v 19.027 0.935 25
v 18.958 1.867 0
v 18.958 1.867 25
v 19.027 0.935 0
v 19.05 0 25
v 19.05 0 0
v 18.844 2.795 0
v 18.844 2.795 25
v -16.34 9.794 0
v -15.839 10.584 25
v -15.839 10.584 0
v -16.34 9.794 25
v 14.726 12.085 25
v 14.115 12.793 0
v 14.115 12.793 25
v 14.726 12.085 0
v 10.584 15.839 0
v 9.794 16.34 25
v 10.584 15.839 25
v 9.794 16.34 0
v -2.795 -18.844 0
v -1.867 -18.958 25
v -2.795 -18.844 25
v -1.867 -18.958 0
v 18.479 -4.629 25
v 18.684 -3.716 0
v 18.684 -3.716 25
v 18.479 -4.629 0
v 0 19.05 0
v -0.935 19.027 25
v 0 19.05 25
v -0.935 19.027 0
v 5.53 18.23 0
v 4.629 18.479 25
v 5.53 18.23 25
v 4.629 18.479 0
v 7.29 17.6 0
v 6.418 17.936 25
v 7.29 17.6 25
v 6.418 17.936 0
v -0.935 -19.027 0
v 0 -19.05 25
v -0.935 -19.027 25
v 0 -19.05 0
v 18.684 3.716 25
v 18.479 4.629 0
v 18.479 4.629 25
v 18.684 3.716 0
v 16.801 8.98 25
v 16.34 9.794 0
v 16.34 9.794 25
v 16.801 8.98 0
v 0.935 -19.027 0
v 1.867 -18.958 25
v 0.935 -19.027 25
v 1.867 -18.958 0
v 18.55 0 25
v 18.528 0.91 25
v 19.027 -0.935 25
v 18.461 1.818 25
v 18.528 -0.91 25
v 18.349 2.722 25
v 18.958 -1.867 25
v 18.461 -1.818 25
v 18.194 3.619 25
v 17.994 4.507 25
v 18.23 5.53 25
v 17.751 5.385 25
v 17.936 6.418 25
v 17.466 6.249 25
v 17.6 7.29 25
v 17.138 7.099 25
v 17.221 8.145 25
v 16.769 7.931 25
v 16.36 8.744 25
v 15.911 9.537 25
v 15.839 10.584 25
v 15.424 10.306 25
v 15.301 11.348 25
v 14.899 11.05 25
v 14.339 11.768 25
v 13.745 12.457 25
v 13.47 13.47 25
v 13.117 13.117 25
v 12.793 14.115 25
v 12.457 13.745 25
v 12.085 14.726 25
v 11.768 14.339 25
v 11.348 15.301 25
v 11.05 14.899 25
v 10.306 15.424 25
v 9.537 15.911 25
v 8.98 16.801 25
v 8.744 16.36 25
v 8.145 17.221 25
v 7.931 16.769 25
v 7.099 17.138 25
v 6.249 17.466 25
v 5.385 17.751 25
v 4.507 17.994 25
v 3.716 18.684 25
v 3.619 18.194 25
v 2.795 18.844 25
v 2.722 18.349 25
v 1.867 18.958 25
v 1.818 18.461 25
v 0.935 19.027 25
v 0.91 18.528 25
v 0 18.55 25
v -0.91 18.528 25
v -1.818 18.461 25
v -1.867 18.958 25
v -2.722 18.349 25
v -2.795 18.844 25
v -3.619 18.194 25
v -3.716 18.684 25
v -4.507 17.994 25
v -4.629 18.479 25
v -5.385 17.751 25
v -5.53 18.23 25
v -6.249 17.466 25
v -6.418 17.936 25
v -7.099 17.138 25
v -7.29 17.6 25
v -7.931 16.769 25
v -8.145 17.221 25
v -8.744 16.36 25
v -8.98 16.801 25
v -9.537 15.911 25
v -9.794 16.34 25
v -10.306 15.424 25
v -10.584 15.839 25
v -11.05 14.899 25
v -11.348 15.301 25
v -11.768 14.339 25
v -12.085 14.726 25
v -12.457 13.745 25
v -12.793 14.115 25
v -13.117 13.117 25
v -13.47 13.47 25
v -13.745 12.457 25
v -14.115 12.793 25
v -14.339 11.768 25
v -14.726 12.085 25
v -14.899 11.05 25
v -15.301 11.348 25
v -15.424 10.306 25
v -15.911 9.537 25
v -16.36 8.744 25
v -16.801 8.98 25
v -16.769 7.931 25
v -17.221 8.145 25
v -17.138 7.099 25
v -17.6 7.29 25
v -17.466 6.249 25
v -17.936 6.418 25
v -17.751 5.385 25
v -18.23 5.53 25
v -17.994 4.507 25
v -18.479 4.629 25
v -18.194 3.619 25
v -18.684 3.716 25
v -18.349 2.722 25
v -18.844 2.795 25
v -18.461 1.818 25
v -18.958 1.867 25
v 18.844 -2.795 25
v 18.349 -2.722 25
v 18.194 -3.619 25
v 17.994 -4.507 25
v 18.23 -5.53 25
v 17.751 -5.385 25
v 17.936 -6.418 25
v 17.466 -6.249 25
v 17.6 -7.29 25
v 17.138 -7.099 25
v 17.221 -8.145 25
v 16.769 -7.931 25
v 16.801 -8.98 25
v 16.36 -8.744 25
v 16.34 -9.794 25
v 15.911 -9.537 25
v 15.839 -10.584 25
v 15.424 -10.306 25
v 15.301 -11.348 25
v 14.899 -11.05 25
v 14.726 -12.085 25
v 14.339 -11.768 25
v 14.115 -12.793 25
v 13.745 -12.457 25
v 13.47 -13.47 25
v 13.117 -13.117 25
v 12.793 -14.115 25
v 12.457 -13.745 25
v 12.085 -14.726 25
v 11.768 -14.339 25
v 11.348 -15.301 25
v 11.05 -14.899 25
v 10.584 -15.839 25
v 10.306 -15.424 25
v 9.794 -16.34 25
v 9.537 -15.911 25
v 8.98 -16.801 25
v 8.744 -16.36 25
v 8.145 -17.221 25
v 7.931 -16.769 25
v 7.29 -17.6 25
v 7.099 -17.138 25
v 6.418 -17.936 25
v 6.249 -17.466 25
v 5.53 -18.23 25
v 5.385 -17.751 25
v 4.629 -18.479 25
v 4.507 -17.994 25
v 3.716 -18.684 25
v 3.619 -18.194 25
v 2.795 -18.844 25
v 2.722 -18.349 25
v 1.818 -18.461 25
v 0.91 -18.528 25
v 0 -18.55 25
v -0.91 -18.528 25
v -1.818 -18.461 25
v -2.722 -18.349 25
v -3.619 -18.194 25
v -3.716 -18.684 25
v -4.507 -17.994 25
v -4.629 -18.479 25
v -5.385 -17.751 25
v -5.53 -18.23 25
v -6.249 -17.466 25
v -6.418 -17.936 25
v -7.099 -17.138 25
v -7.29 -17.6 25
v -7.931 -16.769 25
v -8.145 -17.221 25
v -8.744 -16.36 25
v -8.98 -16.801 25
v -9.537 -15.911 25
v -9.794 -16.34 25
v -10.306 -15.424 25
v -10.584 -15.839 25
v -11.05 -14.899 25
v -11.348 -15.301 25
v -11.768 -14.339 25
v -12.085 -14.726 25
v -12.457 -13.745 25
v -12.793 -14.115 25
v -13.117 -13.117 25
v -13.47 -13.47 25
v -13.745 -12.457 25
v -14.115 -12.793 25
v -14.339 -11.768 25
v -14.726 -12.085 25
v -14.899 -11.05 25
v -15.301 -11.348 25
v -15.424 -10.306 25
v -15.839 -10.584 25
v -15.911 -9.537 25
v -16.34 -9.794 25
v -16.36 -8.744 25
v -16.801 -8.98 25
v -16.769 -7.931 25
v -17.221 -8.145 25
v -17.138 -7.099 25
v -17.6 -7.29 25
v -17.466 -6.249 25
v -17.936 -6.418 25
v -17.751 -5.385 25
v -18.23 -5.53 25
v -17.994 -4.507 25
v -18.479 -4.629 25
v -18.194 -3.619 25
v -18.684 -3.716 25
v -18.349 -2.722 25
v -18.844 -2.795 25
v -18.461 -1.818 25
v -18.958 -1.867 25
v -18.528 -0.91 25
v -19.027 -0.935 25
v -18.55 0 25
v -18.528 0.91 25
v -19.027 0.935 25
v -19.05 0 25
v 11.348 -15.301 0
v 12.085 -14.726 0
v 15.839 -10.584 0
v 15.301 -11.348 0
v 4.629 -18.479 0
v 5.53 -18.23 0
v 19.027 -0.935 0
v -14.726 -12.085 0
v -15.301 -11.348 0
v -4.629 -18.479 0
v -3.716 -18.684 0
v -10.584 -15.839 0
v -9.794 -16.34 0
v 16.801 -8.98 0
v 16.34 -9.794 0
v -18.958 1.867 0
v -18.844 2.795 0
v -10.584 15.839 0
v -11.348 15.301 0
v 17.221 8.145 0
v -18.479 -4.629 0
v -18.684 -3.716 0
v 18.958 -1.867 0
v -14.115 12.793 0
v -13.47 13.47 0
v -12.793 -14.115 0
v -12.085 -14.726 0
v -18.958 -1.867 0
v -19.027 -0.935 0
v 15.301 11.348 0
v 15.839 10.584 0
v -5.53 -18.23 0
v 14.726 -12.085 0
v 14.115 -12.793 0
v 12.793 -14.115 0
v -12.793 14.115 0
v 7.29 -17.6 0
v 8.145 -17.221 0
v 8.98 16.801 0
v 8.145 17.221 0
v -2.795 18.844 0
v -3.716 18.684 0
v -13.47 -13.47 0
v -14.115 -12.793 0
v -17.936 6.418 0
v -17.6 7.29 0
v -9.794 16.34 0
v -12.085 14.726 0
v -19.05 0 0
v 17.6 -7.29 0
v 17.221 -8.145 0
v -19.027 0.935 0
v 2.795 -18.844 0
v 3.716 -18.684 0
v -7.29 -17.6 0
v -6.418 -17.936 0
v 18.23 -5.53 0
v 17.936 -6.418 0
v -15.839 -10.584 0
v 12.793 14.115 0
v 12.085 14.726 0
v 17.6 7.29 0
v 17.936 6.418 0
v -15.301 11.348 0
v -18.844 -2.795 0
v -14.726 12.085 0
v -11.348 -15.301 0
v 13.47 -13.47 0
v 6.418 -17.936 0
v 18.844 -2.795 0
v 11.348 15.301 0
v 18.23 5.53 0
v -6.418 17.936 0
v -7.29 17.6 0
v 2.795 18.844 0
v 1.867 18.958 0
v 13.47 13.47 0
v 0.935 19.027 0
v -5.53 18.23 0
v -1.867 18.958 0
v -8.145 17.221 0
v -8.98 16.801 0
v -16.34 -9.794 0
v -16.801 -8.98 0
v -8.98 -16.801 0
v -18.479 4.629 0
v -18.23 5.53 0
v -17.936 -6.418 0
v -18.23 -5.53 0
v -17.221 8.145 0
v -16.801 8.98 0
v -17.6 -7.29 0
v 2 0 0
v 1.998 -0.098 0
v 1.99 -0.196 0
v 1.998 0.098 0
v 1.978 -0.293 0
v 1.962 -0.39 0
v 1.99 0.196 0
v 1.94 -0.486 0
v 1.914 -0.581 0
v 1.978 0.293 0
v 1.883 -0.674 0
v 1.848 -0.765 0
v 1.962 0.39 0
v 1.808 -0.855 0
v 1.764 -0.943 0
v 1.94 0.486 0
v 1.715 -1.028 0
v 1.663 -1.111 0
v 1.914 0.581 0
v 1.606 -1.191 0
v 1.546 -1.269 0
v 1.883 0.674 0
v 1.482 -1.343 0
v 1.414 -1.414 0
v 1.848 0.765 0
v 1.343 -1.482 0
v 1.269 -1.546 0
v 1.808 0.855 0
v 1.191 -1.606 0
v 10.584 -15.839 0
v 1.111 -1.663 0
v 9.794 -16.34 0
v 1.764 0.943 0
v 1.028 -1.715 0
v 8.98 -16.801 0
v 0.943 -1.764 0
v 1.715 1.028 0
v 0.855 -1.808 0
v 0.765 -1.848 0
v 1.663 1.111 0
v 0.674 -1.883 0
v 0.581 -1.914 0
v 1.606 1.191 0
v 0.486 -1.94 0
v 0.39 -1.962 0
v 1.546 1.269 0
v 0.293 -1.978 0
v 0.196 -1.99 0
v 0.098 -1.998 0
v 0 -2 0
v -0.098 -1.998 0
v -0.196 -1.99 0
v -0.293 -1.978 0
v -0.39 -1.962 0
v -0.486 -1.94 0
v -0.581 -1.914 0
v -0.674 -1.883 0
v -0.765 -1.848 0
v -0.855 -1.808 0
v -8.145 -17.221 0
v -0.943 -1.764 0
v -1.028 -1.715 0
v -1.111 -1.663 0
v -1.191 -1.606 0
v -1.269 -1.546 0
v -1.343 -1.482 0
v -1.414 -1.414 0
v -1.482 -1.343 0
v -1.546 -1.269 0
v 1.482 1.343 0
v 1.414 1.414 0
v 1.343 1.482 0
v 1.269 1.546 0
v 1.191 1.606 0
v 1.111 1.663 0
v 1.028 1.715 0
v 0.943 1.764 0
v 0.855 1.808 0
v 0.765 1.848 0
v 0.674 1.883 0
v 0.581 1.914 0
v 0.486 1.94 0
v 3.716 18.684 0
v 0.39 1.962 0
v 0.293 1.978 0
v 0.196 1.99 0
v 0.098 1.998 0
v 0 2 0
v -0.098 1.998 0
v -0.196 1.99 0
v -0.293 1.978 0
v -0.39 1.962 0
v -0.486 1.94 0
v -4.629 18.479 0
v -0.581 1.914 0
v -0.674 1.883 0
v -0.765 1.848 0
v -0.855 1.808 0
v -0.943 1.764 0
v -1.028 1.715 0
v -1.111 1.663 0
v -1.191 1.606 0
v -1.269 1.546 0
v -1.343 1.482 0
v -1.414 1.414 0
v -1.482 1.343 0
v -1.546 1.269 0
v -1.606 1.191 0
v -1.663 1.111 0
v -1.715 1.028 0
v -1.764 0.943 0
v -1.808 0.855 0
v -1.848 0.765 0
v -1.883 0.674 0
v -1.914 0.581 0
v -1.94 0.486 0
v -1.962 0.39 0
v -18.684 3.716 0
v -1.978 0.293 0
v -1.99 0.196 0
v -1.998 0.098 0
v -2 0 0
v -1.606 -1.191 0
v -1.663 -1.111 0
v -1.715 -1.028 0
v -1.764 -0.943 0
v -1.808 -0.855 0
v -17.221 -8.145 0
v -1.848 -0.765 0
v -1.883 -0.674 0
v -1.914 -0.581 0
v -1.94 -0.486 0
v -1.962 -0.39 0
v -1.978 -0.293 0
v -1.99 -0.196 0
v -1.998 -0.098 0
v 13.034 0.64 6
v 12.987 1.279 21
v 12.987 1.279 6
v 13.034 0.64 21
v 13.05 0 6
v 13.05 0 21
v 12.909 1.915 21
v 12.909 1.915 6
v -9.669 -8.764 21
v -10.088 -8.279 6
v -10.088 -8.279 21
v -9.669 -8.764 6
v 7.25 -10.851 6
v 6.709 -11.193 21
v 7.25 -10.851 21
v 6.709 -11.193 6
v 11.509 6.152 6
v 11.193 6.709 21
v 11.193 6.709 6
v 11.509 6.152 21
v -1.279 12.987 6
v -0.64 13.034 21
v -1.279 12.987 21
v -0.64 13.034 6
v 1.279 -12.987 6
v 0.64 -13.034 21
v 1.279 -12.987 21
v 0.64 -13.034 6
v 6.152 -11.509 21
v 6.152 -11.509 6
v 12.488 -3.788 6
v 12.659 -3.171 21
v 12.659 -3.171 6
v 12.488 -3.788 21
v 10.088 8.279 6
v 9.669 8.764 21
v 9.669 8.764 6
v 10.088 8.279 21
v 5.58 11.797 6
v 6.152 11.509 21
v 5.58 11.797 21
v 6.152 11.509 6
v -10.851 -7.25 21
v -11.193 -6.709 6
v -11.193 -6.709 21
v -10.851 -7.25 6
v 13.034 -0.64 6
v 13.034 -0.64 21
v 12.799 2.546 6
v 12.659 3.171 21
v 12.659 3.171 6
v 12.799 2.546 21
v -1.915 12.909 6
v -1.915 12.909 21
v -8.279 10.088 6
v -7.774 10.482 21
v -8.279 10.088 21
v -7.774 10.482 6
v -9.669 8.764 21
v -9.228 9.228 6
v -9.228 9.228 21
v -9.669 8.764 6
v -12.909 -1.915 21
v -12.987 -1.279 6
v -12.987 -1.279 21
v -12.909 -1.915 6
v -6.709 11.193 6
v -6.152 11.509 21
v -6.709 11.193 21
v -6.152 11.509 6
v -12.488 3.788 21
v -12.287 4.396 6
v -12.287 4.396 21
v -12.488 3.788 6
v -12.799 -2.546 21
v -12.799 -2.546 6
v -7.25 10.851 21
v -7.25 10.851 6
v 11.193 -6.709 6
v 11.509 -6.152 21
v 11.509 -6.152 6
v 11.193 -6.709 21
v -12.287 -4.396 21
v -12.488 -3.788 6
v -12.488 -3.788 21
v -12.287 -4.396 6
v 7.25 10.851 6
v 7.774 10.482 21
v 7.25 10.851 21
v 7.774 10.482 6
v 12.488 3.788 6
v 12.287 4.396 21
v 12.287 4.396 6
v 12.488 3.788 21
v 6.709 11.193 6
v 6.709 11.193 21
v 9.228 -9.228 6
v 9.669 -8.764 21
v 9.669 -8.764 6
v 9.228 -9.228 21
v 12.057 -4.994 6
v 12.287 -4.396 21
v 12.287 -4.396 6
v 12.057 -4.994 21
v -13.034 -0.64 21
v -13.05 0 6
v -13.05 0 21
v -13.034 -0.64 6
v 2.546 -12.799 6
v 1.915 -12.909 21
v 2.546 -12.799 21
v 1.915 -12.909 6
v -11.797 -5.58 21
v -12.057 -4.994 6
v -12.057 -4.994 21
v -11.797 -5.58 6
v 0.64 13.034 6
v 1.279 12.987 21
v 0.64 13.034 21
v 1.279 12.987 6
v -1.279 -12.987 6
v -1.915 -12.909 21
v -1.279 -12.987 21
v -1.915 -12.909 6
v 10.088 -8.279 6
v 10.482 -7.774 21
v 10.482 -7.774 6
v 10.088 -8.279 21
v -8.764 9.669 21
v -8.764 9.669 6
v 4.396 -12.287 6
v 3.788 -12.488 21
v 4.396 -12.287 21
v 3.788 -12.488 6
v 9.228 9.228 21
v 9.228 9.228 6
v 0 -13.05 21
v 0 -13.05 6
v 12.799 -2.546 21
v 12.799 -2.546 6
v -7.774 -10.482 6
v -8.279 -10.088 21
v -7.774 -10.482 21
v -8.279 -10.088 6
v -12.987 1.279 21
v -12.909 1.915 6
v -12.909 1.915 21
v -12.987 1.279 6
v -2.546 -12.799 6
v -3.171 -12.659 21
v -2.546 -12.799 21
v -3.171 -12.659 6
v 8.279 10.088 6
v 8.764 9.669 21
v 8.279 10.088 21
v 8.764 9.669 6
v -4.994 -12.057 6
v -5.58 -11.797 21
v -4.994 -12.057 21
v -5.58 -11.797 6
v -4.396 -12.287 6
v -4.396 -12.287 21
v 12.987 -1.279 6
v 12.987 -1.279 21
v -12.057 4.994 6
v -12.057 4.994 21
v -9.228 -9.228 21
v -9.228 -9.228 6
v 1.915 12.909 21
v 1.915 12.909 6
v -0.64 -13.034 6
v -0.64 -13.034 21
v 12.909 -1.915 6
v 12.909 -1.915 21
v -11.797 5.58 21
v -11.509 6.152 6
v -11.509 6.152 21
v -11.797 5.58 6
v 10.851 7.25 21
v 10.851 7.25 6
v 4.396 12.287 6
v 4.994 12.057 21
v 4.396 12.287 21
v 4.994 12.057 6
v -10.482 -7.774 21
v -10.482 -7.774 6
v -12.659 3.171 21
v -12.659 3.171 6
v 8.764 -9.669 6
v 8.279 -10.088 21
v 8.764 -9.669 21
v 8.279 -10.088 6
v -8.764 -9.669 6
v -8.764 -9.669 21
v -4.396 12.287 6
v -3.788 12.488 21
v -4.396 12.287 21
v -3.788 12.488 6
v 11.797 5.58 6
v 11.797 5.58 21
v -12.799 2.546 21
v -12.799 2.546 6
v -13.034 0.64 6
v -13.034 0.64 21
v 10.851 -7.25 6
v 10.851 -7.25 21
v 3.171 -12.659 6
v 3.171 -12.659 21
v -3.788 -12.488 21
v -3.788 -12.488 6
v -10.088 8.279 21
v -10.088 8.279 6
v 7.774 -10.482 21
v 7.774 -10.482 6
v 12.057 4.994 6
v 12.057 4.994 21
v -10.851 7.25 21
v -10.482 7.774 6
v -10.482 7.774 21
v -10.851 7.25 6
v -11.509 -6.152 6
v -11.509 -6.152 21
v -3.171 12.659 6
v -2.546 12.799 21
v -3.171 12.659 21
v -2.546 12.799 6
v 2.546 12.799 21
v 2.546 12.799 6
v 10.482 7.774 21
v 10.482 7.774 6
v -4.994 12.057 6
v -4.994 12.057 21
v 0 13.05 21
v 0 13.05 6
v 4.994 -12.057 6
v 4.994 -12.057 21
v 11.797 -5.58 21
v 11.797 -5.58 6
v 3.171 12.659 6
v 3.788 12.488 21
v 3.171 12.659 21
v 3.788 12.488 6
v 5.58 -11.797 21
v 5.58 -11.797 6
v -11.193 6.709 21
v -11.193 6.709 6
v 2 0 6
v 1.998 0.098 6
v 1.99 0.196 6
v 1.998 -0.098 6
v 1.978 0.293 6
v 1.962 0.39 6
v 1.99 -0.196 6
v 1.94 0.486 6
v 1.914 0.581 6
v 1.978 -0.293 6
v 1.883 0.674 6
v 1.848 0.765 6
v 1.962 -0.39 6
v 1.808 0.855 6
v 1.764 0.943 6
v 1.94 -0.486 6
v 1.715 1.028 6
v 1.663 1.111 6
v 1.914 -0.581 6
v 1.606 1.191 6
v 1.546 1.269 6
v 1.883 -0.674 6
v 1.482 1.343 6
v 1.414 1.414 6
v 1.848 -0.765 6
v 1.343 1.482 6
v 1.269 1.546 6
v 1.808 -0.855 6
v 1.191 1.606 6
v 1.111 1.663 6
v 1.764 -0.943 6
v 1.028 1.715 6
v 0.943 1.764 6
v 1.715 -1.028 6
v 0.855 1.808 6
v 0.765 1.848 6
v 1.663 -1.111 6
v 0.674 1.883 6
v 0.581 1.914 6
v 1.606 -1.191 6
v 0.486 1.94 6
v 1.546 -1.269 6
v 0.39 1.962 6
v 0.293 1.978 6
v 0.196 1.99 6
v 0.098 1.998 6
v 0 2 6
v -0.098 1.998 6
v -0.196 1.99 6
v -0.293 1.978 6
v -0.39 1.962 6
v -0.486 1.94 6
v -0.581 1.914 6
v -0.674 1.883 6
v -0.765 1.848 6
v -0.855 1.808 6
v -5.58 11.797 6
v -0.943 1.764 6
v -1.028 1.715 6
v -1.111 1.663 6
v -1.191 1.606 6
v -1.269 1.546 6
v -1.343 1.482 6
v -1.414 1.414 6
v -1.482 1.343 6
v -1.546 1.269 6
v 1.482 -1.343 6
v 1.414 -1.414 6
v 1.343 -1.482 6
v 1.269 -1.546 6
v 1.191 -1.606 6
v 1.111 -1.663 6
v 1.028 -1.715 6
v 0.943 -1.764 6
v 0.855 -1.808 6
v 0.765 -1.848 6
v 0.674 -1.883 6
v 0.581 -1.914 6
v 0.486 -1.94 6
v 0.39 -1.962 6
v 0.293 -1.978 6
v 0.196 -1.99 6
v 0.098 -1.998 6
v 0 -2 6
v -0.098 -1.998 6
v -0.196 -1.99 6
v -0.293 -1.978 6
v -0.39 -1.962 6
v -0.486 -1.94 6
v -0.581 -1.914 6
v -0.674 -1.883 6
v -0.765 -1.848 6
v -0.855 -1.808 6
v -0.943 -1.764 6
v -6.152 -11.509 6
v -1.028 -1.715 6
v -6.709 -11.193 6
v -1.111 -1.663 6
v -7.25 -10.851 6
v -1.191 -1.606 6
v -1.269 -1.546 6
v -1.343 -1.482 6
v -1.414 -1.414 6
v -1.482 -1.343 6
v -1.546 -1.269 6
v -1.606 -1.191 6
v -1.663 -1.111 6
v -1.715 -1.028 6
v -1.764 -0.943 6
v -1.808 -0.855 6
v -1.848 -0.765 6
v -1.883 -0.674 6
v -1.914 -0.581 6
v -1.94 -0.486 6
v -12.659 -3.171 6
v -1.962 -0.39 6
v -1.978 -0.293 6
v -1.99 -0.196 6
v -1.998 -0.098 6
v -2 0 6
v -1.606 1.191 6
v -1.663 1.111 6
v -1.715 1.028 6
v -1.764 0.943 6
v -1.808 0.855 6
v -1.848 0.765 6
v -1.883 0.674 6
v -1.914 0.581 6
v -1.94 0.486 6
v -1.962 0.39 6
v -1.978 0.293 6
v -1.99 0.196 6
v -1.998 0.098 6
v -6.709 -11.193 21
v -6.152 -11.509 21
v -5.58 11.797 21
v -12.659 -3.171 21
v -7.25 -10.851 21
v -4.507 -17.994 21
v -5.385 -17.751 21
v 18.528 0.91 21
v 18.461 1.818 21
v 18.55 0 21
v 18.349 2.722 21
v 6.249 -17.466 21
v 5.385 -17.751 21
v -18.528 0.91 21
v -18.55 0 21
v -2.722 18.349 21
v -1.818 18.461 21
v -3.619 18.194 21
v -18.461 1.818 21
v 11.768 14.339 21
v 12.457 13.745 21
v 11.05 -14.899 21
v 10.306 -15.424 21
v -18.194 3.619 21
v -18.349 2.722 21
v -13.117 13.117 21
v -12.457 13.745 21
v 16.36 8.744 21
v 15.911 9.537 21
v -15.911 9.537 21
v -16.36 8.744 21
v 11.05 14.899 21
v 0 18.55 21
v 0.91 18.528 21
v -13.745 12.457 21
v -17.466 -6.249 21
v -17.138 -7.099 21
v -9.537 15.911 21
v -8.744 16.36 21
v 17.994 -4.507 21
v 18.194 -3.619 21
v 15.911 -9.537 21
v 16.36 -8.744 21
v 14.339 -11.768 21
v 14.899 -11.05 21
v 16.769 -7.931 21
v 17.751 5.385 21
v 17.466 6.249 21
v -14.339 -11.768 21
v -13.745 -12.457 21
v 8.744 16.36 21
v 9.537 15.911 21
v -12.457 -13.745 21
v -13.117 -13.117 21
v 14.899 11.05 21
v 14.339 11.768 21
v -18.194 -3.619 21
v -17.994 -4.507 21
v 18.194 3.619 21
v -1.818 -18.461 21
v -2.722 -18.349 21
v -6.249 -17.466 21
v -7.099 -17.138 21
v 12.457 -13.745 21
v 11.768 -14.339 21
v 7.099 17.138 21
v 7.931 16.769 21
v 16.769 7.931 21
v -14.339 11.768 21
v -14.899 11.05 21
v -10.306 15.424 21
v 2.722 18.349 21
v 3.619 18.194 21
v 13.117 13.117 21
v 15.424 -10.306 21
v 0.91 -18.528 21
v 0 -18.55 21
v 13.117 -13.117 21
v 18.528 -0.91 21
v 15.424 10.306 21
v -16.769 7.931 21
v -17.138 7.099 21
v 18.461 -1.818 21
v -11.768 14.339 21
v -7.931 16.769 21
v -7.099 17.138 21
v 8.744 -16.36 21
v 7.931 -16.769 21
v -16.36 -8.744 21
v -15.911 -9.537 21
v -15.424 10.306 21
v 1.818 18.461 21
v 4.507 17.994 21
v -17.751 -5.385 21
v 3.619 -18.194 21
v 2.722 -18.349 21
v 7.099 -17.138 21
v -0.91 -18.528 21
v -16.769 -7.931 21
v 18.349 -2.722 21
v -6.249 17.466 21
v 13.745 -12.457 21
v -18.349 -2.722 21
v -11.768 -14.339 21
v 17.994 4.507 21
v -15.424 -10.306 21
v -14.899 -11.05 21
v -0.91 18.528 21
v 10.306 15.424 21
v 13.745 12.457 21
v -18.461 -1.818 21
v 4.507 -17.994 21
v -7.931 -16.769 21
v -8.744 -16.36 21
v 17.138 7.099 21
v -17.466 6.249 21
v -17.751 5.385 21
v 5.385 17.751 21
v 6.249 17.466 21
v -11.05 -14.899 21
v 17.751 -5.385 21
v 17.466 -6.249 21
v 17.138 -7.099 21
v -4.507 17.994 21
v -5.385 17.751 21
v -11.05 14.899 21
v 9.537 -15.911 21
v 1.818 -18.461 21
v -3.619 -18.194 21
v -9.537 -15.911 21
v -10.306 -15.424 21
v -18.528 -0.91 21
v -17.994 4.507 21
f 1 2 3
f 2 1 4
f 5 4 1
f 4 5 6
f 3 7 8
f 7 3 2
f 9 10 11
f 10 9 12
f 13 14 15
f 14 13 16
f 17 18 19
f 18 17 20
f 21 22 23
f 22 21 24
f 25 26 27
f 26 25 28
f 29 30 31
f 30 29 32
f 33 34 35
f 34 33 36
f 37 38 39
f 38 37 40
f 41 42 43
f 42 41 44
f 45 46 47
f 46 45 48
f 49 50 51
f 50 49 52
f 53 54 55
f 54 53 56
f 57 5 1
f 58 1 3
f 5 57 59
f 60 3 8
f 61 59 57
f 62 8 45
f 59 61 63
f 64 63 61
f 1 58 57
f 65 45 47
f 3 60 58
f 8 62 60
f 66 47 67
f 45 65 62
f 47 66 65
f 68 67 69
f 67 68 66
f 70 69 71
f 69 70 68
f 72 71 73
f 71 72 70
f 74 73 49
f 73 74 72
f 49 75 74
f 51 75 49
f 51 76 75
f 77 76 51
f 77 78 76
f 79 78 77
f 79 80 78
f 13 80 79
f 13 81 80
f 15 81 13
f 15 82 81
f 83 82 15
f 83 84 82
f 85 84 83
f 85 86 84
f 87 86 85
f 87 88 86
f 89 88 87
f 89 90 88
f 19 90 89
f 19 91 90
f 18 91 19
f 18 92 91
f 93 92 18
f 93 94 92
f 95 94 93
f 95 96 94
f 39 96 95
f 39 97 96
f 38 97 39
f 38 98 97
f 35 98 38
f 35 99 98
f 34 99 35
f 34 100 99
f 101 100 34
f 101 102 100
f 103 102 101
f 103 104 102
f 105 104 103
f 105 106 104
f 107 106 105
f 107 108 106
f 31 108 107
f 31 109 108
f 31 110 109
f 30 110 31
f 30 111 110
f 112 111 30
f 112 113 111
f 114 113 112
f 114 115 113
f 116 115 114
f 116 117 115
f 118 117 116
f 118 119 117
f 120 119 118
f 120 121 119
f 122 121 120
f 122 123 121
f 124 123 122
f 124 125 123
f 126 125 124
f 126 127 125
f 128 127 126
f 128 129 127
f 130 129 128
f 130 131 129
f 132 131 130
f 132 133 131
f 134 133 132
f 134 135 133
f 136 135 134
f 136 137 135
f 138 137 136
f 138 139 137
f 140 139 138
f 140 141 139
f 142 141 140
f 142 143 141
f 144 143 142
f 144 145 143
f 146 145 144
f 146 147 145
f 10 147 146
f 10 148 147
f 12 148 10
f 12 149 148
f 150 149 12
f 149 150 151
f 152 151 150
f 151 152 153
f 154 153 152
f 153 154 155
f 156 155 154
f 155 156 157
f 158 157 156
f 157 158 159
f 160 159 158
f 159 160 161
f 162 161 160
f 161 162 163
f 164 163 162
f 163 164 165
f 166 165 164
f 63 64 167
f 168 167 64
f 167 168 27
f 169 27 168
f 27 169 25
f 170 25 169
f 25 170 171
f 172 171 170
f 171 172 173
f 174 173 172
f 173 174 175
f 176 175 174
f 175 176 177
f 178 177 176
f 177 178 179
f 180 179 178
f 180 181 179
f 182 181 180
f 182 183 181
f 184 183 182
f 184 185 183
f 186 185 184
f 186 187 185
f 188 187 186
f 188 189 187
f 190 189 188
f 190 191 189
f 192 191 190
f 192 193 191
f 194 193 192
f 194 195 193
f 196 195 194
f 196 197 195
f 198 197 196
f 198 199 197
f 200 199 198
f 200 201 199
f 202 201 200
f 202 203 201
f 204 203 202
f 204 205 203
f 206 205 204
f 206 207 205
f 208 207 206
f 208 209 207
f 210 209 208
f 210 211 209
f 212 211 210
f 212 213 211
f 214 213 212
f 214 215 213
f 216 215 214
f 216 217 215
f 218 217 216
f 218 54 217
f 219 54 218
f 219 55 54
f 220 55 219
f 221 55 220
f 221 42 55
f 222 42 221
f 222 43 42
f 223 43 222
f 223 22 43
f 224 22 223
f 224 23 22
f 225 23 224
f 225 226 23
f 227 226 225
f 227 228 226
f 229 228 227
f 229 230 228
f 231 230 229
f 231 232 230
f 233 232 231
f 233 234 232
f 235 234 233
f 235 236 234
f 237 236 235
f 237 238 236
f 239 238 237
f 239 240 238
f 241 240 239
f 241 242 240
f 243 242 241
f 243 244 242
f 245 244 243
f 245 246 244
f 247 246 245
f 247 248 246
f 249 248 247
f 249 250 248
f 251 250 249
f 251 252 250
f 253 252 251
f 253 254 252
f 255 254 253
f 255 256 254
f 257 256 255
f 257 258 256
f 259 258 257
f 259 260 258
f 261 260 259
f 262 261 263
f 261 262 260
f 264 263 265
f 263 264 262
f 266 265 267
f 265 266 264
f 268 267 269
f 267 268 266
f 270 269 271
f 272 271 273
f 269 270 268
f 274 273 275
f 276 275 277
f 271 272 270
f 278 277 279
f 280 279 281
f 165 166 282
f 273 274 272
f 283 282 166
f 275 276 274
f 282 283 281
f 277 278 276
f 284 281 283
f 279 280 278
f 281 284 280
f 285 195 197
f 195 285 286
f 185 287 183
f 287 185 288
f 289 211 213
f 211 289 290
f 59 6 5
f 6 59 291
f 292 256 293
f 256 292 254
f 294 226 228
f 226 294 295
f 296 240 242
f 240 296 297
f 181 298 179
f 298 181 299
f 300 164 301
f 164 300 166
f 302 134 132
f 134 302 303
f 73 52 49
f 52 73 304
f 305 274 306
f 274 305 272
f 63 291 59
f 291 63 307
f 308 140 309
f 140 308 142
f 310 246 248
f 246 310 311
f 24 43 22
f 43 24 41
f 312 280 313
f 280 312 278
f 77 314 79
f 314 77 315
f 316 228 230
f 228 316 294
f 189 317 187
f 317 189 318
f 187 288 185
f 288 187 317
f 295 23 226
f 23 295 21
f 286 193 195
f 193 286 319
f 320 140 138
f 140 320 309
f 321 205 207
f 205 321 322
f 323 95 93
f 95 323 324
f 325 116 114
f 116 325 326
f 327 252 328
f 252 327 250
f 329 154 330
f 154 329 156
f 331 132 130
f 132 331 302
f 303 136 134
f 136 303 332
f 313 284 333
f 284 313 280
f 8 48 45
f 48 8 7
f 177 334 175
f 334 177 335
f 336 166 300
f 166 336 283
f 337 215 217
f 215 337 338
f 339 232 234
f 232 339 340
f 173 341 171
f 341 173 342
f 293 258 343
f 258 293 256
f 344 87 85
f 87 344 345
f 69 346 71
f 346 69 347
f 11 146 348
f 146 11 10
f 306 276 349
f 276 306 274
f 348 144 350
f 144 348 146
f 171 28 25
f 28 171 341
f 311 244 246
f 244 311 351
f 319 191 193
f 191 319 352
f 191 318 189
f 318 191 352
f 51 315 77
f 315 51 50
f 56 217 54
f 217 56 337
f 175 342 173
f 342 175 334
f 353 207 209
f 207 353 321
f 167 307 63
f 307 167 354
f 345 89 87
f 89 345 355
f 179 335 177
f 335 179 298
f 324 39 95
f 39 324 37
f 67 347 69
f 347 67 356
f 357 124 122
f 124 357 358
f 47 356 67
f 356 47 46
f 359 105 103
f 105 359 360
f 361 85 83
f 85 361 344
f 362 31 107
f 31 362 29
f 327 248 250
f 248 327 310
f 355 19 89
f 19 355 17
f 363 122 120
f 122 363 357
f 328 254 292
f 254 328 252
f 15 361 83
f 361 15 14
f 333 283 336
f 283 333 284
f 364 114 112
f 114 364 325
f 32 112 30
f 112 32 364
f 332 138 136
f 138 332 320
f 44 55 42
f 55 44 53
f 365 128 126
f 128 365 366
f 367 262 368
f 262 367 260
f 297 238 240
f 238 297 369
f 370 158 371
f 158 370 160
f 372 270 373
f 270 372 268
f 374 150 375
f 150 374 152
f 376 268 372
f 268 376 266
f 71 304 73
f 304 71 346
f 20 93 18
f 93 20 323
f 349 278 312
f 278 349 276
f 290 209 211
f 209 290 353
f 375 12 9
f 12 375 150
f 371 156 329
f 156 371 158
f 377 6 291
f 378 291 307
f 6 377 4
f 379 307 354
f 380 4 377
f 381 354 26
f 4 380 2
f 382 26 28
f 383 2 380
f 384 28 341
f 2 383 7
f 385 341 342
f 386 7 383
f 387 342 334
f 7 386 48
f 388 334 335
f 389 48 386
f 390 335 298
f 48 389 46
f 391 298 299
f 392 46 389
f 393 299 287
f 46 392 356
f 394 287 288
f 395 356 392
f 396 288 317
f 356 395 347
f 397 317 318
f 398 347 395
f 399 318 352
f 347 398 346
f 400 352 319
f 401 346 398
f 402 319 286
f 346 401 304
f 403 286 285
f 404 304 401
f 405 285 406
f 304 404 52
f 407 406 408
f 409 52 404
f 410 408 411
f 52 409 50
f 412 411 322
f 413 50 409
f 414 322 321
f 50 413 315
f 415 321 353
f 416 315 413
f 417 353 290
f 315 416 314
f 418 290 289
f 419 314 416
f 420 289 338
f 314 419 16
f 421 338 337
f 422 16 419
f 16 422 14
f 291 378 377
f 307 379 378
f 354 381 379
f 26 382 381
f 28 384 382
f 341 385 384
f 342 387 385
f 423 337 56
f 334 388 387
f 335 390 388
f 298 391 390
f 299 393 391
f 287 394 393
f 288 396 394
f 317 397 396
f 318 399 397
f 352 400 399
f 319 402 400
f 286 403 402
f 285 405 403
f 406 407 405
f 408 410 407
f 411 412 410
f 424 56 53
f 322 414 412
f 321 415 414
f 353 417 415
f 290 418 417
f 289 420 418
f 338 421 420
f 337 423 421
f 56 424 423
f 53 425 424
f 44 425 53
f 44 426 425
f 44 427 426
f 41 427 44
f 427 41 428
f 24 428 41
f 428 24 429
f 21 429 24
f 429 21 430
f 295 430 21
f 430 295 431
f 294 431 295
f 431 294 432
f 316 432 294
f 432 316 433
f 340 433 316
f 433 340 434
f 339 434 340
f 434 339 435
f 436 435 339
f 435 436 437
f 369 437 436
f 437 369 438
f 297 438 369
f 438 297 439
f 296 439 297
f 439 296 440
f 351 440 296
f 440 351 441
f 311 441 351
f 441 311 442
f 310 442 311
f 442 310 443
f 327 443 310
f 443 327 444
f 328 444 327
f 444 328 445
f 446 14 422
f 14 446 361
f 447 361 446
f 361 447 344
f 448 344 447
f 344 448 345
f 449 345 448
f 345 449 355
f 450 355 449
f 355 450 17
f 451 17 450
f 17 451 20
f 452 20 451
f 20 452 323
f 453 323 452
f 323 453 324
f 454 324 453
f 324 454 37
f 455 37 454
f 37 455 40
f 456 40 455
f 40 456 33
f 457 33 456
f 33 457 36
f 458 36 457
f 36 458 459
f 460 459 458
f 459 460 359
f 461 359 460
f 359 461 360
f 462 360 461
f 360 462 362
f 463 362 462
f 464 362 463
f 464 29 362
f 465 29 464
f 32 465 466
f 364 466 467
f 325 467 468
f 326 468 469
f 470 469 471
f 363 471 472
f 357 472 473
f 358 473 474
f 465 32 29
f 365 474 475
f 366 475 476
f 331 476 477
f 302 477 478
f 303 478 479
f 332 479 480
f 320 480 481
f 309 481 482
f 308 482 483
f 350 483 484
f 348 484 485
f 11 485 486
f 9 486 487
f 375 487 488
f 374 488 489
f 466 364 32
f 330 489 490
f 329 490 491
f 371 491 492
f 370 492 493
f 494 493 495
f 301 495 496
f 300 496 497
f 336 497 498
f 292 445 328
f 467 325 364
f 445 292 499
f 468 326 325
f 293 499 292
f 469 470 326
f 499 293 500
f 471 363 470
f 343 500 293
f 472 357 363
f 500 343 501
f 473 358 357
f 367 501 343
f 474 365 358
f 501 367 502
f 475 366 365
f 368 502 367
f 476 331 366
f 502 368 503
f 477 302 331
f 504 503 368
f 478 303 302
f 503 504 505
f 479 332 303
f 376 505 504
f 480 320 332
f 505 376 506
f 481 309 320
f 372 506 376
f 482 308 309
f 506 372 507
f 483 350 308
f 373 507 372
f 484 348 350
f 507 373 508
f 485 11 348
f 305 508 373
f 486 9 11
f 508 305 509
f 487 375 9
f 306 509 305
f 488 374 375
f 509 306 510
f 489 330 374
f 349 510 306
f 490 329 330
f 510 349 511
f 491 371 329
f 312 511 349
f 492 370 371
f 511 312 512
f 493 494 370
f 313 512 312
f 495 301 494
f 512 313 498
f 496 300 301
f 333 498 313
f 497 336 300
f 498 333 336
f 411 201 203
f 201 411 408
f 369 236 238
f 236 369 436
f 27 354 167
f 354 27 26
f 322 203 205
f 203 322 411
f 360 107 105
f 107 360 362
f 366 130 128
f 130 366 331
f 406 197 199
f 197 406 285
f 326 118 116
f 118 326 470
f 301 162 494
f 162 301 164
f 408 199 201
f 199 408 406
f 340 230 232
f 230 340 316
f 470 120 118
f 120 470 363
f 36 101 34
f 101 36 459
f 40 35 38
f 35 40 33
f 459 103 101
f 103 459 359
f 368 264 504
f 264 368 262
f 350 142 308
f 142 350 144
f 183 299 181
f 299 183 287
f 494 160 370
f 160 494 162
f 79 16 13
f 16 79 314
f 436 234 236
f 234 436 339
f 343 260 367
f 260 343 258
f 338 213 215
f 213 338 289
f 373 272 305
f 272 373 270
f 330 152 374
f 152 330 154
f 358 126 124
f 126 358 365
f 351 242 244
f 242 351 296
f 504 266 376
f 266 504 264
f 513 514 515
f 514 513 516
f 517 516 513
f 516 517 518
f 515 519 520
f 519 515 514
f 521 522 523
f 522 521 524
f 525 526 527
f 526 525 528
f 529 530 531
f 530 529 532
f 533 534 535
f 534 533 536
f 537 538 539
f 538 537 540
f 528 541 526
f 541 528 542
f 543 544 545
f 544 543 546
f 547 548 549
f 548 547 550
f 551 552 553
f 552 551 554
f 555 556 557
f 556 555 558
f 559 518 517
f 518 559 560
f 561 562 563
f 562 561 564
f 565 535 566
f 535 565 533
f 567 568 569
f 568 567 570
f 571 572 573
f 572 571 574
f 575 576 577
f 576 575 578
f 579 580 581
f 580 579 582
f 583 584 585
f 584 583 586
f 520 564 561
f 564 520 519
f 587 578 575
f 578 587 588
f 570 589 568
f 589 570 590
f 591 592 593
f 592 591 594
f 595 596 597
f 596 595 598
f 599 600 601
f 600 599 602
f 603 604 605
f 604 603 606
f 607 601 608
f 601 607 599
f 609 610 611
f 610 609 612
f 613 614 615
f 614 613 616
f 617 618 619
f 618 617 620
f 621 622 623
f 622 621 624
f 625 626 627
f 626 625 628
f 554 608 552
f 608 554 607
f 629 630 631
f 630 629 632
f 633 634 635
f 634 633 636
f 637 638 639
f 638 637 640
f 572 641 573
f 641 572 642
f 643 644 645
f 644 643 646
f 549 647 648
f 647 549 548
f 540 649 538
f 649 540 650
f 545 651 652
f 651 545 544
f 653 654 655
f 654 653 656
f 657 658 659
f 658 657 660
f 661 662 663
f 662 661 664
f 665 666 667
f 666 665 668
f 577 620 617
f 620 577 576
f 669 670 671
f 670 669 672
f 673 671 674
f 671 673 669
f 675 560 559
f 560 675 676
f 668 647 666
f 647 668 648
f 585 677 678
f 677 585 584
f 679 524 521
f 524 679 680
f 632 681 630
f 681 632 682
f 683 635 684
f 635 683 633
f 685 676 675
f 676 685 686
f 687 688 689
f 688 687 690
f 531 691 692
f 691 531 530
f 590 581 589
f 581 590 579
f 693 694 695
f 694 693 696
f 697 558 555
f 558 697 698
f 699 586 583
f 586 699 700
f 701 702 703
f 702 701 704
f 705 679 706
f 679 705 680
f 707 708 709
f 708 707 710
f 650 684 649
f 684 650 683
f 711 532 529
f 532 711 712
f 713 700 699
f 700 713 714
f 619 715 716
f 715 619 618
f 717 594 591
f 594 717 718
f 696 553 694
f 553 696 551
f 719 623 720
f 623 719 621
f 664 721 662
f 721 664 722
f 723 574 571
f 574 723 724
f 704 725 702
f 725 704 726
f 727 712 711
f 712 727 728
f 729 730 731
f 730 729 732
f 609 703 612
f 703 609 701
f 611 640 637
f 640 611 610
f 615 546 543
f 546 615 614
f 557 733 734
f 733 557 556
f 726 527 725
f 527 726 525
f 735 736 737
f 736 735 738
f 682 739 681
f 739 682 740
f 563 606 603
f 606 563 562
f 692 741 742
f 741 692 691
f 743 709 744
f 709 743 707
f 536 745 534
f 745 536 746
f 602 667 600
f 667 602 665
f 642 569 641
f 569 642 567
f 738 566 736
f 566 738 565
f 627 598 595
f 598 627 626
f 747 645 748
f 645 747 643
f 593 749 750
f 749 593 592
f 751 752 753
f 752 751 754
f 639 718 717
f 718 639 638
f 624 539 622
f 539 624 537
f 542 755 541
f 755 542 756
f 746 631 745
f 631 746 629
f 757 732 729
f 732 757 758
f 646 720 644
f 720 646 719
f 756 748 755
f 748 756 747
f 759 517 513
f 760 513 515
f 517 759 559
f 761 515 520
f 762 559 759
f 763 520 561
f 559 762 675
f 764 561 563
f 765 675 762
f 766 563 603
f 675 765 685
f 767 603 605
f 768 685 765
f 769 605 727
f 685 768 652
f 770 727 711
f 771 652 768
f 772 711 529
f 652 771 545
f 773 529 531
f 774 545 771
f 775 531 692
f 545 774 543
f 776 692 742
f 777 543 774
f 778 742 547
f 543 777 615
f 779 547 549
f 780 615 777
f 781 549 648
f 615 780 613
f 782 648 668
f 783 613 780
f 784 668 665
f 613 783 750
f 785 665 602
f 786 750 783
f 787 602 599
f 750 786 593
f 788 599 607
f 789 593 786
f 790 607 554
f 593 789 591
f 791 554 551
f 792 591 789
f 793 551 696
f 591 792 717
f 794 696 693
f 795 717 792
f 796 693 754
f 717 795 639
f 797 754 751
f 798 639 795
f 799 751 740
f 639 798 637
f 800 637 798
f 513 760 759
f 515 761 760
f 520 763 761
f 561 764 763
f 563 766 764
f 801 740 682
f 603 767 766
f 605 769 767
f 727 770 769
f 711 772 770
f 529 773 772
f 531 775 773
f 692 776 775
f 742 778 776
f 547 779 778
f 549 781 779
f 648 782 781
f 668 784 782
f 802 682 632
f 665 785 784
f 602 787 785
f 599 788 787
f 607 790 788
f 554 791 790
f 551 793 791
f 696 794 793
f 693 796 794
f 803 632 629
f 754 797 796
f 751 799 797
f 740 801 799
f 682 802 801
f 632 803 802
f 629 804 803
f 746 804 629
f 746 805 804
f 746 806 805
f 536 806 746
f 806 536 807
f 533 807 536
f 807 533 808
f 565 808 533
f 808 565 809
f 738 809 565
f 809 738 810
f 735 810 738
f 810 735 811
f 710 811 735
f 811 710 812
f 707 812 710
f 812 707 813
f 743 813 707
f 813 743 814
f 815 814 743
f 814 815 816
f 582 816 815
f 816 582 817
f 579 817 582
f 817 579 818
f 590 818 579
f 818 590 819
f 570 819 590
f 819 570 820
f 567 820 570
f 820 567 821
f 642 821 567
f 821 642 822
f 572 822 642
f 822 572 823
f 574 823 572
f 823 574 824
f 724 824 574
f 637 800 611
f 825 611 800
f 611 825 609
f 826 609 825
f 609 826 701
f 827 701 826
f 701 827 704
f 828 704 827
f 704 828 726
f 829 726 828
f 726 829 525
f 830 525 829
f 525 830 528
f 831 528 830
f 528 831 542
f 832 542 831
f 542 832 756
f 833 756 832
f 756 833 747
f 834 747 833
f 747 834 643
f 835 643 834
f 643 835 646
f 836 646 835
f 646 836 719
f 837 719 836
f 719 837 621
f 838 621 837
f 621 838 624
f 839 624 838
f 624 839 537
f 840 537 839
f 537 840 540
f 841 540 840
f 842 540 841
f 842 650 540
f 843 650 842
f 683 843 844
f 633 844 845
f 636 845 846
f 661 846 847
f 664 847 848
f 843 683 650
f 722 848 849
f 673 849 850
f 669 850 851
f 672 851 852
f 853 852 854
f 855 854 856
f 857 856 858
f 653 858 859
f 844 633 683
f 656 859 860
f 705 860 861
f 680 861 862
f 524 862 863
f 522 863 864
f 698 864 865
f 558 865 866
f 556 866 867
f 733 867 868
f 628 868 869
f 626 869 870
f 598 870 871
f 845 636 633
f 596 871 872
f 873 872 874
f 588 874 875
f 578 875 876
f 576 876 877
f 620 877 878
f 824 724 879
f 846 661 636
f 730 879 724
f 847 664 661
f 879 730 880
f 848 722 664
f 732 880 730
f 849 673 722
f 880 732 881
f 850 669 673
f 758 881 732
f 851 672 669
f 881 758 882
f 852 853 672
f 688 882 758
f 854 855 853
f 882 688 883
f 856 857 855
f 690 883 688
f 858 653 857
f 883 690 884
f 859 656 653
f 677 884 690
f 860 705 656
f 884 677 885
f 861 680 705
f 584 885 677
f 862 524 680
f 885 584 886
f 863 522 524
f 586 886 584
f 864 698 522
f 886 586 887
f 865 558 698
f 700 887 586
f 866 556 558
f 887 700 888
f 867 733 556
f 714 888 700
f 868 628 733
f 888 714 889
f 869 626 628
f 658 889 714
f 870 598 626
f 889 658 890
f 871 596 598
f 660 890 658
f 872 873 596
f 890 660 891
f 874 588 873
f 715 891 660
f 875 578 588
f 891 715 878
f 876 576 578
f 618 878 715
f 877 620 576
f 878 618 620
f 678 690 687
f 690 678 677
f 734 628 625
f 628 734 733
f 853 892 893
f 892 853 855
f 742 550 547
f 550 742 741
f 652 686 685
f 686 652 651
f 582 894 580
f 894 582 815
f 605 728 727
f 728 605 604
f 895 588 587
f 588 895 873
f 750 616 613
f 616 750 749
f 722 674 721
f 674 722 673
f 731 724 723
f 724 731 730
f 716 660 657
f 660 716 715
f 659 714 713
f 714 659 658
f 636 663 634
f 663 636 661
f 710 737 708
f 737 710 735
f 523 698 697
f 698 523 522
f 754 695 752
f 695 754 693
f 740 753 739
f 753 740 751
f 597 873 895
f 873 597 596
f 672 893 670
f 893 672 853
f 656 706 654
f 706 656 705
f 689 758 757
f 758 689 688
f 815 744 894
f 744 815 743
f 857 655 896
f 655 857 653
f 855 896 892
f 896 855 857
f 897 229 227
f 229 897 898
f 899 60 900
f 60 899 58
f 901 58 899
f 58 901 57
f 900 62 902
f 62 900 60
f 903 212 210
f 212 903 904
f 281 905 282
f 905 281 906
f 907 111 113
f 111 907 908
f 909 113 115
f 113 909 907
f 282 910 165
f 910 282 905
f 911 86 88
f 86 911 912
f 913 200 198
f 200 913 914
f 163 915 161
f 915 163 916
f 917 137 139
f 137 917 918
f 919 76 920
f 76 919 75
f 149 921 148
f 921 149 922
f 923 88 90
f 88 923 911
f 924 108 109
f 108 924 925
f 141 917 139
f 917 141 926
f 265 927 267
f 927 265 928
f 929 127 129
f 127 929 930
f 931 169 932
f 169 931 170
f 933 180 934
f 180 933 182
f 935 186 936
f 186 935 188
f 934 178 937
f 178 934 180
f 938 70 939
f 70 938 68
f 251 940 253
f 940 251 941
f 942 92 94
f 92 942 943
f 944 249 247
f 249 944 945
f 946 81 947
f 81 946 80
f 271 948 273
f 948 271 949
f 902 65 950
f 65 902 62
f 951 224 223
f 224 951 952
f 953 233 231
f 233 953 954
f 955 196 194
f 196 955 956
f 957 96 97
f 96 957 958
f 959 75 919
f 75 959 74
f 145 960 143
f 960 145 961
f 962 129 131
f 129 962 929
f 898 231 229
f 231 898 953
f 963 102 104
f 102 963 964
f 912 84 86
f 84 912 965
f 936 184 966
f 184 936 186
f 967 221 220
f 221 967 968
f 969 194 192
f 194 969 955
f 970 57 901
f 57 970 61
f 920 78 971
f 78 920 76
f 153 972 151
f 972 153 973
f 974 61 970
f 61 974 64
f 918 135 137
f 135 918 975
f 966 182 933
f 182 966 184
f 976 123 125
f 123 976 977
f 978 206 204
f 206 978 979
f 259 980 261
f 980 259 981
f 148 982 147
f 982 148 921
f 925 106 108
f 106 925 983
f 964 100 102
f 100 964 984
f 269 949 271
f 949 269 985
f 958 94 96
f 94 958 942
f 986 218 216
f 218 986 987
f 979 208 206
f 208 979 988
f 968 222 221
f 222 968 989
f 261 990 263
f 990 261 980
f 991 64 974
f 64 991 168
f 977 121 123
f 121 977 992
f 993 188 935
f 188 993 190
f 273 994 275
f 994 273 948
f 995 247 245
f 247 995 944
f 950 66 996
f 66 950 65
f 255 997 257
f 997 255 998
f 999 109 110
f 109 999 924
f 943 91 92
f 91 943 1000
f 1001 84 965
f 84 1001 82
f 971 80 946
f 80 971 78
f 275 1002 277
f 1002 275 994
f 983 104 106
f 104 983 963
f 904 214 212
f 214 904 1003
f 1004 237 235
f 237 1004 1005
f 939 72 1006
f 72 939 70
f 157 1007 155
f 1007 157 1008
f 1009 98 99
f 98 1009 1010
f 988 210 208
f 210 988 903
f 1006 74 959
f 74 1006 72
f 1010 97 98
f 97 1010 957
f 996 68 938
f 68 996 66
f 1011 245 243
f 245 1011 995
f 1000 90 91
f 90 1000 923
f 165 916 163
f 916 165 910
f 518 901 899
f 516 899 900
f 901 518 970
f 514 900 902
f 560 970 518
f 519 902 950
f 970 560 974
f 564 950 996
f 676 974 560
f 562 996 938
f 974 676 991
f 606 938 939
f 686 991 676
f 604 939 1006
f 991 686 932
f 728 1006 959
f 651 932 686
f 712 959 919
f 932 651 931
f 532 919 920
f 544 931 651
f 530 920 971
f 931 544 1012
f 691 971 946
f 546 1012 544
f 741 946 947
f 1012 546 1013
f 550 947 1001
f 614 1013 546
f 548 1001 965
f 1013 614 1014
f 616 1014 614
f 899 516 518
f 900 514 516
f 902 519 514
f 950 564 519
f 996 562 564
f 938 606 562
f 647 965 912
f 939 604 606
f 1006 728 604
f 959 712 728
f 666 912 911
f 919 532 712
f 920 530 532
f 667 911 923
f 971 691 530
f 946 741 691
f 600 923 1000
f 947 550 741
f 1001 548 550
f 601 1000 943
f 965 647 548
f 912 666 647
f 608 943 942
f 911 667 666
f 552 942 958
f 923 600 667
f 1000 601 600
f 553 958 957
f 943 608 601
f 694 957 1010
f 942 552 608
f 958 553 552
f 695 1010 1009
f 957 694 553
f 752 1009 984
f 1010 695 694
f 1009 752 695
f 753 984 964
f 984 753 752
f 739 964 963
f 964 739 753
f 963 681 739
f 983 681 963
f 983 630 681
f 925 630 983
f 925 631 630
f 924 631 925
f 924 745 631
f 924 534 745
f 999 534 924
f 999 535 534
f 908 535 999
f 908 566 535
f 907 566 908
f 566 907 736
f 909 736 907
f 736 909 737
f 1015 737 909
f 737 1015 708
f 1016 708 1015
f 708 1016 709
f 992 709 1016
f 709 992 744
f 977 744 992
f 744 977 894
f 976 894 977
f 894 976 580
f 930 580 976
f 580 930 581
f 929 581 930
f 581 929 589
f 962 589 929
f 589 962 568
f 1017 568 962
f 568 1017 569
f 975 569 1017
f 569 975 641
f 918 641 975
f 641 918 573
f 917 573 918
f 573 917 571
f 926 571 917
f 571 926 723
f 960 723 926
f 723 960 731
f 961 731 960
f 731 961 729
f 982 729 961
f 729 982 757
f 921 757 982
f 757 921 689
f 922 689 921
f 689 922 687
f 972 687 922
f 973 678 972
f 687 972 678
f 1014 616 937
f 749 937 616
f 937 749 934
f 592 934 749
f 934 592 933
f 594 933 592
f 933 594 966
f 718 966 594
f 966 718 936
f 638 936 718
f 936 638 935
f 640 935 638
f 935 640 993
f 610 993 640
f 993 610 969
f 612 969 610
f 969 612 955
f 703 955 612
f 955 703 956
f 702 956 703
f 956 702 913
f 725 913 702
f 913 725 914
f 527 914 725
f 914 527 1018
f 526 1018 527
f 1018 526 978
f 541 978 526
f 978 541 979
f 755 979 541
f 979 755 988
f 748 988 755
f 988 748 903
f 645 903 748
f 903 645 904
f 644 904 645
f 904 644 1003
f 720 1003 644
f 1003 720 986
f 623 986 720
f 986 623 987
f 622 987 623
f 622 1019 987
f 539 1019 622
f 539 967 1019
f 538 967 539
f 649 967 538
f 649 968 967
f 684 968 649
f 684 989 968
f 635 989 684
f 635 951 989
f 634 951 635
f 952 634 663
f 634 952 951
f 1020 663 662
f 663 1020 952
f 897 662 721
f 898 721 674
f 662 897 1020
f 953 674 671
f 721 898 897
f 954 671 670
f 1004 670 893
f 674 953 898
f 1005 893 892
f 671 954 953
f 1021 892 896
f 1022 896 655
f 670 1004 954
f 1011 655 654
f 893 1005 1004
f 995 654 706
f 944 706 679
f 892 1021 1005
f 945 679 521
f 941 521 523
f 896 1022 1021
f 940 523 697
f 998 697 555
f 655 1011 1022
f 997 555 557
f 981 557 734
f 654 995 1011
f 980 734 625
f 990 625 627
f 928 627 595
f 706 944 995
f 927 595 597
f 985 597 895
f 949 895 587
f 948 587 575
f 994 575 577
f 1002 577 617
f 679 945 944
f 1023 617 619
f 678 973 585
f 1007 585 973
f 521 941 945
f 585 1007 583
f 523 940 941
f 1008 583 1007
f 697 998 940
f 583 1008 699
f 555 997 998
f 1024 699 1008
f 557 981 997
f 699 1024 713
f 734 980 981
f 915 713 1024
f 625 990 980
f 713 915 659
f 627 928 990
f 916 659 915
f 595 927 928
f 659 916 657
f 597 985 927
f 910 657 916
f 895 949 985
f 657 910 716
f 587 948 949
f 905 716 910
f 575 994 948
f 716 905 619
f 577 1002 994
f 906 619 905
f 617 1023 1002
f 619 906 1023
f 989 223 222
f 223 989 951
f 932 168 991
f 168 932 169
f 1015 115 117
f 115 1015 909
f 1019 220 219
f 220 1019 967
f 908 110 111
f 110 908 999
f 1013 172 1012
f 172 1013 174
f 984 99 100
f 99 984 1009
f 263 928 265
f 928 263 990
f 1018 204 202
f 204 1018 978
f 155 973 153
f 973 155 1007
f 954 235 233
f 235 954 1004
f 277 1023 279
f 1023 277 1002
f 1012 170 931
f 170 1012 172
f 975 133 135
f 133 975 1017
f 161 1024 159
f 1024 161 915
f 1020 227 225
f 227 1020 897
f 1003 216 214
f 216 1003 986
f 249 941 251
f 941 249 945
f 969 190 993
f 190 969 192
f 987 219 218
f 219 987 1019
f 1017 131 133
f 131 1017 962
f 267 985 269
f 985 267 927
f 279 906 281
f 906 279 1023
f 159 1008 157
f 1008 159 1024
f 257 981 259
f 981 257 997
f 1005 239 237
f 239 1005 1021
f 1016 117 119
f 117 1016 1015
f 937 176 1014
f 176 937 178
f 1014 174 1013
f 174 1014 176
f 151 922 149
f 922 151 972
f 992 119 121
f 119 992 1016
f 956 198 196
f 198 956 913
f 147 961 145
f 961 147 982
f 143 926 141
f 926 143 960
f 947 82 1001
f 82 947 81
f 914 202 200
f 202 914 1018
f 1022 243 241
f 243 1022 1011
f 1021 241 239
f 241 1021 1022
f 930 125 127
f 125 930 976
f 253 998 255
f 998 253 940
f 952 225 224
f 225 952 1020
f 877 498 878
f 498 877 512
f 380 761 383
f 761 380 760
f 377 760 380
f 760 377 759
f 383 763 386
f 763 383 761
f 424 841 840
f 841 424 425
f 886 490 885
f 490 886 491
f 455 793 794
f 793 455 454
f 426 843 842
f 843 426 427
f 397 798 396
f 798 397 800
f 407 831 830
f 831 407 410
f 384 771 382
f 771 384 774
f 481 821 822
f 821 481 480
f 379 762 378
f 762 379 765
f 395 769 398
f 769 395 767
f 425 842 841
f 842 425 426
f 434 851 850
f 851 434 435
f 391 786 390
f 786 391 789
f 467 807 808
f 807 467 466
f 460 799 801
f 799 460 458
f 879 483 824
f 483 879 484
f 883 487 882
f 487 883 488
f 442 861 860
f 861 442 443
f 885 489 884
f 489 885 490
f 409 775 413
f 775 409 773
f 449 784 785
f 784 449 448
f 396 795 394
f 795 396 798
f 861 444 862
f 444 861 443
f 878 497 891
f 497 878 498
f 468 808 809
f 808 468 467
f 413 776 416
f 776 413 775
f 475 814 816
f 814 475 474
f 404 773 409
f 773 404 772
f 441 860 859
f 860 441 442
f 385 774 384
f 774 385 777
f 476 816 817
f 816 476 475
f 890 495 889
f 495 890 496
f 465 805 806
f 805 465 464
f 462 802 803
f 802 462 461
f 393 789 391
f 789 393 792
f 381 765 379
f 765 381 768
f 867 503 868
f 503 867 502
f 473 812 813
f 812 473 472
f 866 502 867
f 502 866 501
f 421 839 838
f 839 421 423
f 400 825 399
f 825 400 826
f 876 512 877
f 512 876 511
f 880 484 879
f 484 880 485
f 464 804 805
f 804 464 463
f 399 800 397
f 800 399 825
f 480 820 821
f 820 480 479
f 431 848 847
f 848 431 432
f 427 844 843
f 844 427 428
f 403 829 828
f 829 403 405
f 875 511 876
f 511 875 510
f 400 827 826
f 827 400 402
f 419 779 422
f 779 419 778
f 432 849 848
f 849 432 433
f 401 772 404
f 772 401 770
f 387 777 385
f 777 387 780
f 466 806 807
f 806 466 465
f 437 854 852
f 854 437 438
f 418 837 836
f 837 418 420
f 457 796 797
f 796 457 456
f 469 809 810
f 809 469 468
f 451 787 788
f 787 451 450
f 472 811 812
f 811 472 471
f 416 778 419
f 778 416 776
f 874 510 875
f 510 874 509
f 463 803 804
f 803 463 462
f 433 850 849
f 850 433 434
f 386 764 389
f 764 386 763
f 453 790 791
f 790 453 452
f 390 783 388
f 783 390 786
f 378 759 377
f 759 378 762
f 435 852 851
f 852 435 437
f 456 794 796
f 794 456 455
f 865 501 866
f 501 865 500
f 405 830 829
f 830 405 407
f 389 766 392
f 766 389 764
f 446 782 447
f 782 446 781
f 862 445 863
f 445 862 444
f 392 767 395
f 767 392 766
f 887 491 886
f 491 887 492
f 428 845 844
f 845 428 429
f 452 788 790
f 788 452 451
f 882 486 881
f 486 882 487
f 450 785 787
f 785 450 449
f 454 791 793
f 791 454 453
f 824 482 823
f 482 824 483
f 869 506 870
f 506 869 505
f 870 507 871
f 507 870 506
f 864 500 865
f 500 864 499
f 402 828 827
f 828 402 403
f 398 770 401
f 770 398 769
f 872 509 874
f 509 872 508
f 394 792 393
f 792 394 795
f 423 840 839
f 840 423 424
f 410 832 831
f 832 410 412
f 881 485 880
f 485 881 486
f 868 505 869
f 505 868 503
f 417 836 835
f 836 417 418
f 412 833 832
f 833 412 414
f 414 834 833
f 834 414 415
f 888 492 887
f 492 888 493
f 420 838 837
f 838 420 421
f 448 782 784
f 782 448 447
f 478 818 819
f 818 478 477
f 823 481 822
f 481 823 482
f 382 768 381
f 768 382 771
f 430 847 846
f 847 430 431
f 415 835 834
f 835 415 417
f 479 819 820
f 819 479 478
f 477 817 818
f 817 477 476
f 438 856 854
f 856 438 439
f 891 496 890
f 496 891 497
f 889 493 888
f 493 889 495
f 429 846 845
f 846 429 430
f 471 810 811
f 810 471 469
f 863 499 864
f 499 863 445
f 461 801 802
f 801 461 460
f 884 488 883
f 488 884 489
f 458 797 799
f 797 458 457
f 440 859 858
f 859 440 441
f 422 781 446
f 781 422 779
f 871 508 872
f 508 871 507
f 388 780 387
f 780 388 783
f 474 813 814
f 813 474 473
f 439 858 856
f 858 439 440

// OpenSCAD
// =========================================================================
// GUNDAM ROBOTICS SYSTEMS - BEAM-SABER SOLID-STATE ENDCAP
// HOUSING FOR QUANTUM POWER RECEPTION MANIFOLD (NO BATTERY RETAINER)
// =========================================================================

HILT_OUTER_DIAM   = 38.1;
ENDCAP_LENGTH     = 25.0; 
WALL_THICKNESS    = 6.0;  // Heavy base shielding for quantum termination

INTERNAL_BORE      = HILT_OUTER_DIAM - (2 * WALL_THICKNESS);

$fn = 128;

module solid_state_endcap() {
    color("LightGray", 1.0)
    difference() {
        // Main structural base cap
        cylinder(h = ENDCAP_LENGTH, d = HILT_OUTER_DIAM, center = false);
        
        // Internal cavity for the non-contact Quantum Receiver Terminal
        translate([0, 0, WALL_THICKNESS])
            cylinder(h = ENDCAP_LENGTH, d = INTERNAL_BORE, center = false);
            
        // Fine metric threads machined to lock directly to the lower titanium shell
        translate([0, 0, ENDCAP_LENGTH - 4])
            cylinder(h = 5, d = HILT_OUTER_DIAM - 1.0, center = false);
            
        // Photonic line viewport for real-time laser initialization checks
        translate([0, 0, -1])
            cylinder(h = WALL_THICKNESS + 2, d = 4.0, center = false);
    }
}

solid_state_endcap();
